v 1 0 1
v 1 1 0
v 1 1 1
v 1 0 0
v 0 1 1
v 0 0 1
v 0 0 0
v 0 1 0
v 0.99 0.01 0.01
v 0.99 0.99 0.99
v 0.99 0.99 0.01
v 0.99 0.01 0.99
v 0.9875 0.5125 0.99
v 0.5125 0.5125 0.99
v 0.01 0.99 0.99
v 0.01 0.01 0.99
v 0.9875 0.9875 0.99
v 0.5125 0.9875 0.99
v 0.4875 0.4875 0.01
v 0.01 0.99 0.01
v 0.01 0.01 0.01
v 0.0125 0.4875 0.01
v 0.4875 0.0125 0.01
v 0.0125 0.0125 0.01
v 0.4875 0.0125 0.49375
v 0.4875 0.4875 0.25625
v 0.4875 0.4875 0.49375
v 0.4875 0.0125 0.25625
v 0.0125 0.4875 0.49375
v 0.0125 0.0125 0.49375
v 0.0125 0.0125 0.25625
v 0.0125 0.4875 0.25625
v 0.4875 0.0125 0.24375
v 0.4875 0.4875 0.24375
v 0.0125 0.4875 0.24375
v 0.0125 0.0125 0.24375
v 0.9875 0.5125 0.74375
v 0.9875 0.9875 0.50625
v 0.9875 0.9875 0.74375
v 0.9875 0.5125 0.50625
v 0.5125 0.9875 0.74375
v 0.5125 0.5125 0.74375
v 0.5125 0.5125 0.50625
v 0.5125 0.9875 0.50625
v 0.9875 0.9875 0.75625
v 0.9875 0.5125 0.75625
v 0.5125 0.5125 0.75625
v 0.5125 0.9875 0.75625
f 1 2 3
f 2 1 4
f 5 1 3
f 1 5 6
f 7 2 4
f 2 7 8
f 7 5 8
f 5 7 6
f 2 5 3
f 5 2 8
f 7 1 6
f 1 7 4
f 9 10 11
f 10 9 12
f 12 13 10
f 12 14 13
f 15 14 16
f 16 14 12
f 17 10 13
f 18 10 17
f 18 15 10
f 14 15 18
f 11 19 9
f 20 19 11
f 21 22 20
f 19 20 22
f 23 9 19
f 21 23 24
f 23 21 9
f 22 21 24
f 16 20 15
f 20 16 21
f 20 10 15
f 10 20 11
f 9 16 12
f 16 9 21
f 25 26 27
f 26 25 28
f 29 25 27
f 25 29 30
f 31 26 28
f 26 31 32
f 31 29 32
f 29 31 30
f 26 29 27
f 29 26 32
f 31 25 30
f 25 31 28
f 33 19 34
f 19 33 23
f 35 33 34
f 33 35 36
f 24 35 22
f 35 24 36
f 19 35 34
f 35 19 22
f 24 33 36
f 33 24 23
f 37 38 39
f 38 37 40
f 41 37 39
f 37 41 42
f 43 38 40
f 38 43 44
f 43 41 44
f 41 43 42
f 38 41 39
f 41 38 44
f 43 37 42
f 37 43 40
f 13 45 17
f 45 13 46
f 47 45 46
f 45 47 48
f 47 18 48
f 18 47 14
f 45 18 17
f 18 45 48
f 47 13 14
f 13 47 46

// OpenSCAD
translate([0.25, 0.25, 0.375]) color([0.18861772816501654, 0.2995636798725818, 0.6373620141013281]) cube([0.475, 0.475, 0.2375], center=true);
translate([0.25, 0.25, 0.125]) color([0.4415437475553168, 0.7961450490178668, 0.84634125377522]) cube([0.475, 0.475, 0.2375], center=true);
translate([0.75, 0.75, 0.625]) color([0.8916592015510378, 0.14182509993947134, 0.48137274701024935]) cube([0.475, 0.475, 0.2375], center=true);
translate([0.75, 0.75, 0.875]) color([0.5064966308665176, 0.3611716642845566, 0.4929690929227817]) cube([0.475, 0.475, 0.2375], center=true);
color([0.3,0.3,0.3,0.3]) difference() { cube([1,1,1]); translate([0.01,0.01,0.01]) cube([0.98,0.98,0.98]); }
